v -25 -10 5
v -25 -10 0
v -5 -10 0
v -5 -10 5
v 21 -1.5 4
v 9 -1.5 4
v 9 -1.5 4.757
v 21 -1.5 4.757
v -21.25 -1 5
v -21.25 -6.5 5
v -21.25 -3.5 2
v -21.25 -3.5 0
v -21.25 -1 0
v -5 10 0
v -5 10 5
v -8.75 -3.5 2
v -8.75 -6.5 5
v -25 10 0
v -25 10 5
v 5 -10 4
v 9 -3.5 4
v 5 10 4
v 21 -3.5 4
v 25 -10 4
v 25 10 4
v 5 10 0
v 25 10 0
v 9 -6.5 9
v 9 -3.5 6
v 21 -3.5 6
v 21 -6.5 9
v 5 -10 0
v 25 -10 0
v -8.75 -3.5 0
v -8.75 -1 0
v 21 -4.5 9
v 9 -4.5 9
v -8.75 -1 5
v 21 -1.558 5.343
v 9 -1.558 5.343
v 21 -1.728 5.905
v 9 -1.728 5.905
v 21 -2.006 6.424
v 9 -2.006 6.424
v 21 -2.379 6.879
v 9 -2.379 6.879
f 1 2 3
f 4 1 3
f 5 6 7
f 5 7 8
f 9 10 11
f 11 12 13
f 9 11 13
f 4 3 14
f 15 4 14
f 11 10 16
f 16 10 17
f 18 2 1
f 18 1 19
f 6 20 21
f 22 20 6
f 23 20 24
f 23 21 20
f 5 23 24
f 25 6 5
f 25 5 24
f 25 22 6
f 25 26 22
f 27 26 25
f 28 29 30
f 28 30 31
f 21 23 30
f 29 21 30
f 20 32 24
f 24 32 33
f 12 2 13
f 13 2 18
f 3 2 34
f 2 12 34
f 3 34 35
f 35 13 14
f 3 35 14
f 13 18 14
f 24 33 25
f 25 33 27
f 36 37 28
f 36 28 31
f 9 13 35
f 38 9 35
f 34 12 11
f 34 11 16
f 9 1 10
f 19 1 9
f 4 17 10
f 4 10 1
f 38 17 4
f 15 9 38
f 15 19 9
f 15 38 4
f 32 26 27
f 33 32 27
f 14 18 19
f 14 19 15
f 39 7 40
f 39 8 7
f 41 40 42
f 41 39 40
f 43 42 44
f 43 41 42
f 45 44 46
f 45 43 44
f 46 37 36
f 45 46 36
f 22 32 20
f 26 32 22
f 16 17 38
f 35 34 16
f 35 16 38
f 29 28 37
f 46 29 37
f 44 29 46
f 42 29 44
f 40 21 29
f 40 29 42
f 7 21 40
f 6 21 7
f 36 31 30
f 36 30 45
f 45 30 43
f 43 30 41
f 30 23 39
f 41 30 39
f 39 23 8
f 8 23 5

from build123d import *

# Parameters (mm, degrees)
F0_W     = 12
F0_H     = 5
F1_DEPTH = 9
F0_W_2   = 20
F0_H_2   = 20
F2_DEPTH = 4
F0_W_3   = 12.5
F0_H_3   = 2.5
F3_DEPTH = 5
F4_SIZE2 = 3
F4_SIZE  = 3
F6_DEPTH = 12
F7_SIZE  = 3
F8_R     = 3


with BuildPart() as f1:
    # F0 (on Top) → F1 (new body)
    with BuildSketch(Plane.XY):
        with Locations((15, -4)):
            Rectangle(F0_W, F0_H)
    extrude(amount=F1_DEPTH)

    # F0 (on Top) → F2 (join)
    with BuildSketch(Plane.XY):
        with Locations((15, 0)):
            Rectangle(F0_W_2, F0_H_2)
        with Locations((15, -4)):
            Rectangle(F0_W, F0_H, mode=Mode.SUBTRACT)
    extrude(amount=F2_DEPTH)

    # F5 (on face) → F6 (cut)
    with BuildSketch(Plane.YZ.offset(21)):
        Polygon((-3.5, 6), (-6.5, 9), (-6.5, 4), (-3.5, 4), align=None)
    extrude(amount=-F6_DEPTH, mode=Mode.SUBTRACT)

    # F7
    f7_edges = [f1.edges().sort_by_distance(p)[0] for p in [
        (15, -1.5, 9),
    ]]
    chamfer(f7_edges, length=F7_SIZE)

    # F8
    f8_edges = [f1.edges().sort_by_distance(p)[0] for p in [
        (15, -1.5, 6),
    ]]
    fillet(f8_edges, radius=F8_R)


with BuildPart() as f3:
    # F0 (on Top) → F3 (new body)
    with BuildSketch(Plane.XY):
        with Locations((-15, 0)):
            Rectangle(F0_W_2, F0_H_2)
        with Locations((-15, -2.25)):
            Rectangle(F0_W_3, F0_H_3, mode=Mode.SUBTRACT)
    extrude(amount=F3_DEPTH)

    # F4
    f4_edges = [f3.edges().sort_by_distance(p)[0] for p in [
        (-15, -3.5, 5),
    ]]
    chamfer(f4_edges, length=F4_SIZE, length2=F4_SIZE2)


solid = Compound([f1.part, f3.part])
